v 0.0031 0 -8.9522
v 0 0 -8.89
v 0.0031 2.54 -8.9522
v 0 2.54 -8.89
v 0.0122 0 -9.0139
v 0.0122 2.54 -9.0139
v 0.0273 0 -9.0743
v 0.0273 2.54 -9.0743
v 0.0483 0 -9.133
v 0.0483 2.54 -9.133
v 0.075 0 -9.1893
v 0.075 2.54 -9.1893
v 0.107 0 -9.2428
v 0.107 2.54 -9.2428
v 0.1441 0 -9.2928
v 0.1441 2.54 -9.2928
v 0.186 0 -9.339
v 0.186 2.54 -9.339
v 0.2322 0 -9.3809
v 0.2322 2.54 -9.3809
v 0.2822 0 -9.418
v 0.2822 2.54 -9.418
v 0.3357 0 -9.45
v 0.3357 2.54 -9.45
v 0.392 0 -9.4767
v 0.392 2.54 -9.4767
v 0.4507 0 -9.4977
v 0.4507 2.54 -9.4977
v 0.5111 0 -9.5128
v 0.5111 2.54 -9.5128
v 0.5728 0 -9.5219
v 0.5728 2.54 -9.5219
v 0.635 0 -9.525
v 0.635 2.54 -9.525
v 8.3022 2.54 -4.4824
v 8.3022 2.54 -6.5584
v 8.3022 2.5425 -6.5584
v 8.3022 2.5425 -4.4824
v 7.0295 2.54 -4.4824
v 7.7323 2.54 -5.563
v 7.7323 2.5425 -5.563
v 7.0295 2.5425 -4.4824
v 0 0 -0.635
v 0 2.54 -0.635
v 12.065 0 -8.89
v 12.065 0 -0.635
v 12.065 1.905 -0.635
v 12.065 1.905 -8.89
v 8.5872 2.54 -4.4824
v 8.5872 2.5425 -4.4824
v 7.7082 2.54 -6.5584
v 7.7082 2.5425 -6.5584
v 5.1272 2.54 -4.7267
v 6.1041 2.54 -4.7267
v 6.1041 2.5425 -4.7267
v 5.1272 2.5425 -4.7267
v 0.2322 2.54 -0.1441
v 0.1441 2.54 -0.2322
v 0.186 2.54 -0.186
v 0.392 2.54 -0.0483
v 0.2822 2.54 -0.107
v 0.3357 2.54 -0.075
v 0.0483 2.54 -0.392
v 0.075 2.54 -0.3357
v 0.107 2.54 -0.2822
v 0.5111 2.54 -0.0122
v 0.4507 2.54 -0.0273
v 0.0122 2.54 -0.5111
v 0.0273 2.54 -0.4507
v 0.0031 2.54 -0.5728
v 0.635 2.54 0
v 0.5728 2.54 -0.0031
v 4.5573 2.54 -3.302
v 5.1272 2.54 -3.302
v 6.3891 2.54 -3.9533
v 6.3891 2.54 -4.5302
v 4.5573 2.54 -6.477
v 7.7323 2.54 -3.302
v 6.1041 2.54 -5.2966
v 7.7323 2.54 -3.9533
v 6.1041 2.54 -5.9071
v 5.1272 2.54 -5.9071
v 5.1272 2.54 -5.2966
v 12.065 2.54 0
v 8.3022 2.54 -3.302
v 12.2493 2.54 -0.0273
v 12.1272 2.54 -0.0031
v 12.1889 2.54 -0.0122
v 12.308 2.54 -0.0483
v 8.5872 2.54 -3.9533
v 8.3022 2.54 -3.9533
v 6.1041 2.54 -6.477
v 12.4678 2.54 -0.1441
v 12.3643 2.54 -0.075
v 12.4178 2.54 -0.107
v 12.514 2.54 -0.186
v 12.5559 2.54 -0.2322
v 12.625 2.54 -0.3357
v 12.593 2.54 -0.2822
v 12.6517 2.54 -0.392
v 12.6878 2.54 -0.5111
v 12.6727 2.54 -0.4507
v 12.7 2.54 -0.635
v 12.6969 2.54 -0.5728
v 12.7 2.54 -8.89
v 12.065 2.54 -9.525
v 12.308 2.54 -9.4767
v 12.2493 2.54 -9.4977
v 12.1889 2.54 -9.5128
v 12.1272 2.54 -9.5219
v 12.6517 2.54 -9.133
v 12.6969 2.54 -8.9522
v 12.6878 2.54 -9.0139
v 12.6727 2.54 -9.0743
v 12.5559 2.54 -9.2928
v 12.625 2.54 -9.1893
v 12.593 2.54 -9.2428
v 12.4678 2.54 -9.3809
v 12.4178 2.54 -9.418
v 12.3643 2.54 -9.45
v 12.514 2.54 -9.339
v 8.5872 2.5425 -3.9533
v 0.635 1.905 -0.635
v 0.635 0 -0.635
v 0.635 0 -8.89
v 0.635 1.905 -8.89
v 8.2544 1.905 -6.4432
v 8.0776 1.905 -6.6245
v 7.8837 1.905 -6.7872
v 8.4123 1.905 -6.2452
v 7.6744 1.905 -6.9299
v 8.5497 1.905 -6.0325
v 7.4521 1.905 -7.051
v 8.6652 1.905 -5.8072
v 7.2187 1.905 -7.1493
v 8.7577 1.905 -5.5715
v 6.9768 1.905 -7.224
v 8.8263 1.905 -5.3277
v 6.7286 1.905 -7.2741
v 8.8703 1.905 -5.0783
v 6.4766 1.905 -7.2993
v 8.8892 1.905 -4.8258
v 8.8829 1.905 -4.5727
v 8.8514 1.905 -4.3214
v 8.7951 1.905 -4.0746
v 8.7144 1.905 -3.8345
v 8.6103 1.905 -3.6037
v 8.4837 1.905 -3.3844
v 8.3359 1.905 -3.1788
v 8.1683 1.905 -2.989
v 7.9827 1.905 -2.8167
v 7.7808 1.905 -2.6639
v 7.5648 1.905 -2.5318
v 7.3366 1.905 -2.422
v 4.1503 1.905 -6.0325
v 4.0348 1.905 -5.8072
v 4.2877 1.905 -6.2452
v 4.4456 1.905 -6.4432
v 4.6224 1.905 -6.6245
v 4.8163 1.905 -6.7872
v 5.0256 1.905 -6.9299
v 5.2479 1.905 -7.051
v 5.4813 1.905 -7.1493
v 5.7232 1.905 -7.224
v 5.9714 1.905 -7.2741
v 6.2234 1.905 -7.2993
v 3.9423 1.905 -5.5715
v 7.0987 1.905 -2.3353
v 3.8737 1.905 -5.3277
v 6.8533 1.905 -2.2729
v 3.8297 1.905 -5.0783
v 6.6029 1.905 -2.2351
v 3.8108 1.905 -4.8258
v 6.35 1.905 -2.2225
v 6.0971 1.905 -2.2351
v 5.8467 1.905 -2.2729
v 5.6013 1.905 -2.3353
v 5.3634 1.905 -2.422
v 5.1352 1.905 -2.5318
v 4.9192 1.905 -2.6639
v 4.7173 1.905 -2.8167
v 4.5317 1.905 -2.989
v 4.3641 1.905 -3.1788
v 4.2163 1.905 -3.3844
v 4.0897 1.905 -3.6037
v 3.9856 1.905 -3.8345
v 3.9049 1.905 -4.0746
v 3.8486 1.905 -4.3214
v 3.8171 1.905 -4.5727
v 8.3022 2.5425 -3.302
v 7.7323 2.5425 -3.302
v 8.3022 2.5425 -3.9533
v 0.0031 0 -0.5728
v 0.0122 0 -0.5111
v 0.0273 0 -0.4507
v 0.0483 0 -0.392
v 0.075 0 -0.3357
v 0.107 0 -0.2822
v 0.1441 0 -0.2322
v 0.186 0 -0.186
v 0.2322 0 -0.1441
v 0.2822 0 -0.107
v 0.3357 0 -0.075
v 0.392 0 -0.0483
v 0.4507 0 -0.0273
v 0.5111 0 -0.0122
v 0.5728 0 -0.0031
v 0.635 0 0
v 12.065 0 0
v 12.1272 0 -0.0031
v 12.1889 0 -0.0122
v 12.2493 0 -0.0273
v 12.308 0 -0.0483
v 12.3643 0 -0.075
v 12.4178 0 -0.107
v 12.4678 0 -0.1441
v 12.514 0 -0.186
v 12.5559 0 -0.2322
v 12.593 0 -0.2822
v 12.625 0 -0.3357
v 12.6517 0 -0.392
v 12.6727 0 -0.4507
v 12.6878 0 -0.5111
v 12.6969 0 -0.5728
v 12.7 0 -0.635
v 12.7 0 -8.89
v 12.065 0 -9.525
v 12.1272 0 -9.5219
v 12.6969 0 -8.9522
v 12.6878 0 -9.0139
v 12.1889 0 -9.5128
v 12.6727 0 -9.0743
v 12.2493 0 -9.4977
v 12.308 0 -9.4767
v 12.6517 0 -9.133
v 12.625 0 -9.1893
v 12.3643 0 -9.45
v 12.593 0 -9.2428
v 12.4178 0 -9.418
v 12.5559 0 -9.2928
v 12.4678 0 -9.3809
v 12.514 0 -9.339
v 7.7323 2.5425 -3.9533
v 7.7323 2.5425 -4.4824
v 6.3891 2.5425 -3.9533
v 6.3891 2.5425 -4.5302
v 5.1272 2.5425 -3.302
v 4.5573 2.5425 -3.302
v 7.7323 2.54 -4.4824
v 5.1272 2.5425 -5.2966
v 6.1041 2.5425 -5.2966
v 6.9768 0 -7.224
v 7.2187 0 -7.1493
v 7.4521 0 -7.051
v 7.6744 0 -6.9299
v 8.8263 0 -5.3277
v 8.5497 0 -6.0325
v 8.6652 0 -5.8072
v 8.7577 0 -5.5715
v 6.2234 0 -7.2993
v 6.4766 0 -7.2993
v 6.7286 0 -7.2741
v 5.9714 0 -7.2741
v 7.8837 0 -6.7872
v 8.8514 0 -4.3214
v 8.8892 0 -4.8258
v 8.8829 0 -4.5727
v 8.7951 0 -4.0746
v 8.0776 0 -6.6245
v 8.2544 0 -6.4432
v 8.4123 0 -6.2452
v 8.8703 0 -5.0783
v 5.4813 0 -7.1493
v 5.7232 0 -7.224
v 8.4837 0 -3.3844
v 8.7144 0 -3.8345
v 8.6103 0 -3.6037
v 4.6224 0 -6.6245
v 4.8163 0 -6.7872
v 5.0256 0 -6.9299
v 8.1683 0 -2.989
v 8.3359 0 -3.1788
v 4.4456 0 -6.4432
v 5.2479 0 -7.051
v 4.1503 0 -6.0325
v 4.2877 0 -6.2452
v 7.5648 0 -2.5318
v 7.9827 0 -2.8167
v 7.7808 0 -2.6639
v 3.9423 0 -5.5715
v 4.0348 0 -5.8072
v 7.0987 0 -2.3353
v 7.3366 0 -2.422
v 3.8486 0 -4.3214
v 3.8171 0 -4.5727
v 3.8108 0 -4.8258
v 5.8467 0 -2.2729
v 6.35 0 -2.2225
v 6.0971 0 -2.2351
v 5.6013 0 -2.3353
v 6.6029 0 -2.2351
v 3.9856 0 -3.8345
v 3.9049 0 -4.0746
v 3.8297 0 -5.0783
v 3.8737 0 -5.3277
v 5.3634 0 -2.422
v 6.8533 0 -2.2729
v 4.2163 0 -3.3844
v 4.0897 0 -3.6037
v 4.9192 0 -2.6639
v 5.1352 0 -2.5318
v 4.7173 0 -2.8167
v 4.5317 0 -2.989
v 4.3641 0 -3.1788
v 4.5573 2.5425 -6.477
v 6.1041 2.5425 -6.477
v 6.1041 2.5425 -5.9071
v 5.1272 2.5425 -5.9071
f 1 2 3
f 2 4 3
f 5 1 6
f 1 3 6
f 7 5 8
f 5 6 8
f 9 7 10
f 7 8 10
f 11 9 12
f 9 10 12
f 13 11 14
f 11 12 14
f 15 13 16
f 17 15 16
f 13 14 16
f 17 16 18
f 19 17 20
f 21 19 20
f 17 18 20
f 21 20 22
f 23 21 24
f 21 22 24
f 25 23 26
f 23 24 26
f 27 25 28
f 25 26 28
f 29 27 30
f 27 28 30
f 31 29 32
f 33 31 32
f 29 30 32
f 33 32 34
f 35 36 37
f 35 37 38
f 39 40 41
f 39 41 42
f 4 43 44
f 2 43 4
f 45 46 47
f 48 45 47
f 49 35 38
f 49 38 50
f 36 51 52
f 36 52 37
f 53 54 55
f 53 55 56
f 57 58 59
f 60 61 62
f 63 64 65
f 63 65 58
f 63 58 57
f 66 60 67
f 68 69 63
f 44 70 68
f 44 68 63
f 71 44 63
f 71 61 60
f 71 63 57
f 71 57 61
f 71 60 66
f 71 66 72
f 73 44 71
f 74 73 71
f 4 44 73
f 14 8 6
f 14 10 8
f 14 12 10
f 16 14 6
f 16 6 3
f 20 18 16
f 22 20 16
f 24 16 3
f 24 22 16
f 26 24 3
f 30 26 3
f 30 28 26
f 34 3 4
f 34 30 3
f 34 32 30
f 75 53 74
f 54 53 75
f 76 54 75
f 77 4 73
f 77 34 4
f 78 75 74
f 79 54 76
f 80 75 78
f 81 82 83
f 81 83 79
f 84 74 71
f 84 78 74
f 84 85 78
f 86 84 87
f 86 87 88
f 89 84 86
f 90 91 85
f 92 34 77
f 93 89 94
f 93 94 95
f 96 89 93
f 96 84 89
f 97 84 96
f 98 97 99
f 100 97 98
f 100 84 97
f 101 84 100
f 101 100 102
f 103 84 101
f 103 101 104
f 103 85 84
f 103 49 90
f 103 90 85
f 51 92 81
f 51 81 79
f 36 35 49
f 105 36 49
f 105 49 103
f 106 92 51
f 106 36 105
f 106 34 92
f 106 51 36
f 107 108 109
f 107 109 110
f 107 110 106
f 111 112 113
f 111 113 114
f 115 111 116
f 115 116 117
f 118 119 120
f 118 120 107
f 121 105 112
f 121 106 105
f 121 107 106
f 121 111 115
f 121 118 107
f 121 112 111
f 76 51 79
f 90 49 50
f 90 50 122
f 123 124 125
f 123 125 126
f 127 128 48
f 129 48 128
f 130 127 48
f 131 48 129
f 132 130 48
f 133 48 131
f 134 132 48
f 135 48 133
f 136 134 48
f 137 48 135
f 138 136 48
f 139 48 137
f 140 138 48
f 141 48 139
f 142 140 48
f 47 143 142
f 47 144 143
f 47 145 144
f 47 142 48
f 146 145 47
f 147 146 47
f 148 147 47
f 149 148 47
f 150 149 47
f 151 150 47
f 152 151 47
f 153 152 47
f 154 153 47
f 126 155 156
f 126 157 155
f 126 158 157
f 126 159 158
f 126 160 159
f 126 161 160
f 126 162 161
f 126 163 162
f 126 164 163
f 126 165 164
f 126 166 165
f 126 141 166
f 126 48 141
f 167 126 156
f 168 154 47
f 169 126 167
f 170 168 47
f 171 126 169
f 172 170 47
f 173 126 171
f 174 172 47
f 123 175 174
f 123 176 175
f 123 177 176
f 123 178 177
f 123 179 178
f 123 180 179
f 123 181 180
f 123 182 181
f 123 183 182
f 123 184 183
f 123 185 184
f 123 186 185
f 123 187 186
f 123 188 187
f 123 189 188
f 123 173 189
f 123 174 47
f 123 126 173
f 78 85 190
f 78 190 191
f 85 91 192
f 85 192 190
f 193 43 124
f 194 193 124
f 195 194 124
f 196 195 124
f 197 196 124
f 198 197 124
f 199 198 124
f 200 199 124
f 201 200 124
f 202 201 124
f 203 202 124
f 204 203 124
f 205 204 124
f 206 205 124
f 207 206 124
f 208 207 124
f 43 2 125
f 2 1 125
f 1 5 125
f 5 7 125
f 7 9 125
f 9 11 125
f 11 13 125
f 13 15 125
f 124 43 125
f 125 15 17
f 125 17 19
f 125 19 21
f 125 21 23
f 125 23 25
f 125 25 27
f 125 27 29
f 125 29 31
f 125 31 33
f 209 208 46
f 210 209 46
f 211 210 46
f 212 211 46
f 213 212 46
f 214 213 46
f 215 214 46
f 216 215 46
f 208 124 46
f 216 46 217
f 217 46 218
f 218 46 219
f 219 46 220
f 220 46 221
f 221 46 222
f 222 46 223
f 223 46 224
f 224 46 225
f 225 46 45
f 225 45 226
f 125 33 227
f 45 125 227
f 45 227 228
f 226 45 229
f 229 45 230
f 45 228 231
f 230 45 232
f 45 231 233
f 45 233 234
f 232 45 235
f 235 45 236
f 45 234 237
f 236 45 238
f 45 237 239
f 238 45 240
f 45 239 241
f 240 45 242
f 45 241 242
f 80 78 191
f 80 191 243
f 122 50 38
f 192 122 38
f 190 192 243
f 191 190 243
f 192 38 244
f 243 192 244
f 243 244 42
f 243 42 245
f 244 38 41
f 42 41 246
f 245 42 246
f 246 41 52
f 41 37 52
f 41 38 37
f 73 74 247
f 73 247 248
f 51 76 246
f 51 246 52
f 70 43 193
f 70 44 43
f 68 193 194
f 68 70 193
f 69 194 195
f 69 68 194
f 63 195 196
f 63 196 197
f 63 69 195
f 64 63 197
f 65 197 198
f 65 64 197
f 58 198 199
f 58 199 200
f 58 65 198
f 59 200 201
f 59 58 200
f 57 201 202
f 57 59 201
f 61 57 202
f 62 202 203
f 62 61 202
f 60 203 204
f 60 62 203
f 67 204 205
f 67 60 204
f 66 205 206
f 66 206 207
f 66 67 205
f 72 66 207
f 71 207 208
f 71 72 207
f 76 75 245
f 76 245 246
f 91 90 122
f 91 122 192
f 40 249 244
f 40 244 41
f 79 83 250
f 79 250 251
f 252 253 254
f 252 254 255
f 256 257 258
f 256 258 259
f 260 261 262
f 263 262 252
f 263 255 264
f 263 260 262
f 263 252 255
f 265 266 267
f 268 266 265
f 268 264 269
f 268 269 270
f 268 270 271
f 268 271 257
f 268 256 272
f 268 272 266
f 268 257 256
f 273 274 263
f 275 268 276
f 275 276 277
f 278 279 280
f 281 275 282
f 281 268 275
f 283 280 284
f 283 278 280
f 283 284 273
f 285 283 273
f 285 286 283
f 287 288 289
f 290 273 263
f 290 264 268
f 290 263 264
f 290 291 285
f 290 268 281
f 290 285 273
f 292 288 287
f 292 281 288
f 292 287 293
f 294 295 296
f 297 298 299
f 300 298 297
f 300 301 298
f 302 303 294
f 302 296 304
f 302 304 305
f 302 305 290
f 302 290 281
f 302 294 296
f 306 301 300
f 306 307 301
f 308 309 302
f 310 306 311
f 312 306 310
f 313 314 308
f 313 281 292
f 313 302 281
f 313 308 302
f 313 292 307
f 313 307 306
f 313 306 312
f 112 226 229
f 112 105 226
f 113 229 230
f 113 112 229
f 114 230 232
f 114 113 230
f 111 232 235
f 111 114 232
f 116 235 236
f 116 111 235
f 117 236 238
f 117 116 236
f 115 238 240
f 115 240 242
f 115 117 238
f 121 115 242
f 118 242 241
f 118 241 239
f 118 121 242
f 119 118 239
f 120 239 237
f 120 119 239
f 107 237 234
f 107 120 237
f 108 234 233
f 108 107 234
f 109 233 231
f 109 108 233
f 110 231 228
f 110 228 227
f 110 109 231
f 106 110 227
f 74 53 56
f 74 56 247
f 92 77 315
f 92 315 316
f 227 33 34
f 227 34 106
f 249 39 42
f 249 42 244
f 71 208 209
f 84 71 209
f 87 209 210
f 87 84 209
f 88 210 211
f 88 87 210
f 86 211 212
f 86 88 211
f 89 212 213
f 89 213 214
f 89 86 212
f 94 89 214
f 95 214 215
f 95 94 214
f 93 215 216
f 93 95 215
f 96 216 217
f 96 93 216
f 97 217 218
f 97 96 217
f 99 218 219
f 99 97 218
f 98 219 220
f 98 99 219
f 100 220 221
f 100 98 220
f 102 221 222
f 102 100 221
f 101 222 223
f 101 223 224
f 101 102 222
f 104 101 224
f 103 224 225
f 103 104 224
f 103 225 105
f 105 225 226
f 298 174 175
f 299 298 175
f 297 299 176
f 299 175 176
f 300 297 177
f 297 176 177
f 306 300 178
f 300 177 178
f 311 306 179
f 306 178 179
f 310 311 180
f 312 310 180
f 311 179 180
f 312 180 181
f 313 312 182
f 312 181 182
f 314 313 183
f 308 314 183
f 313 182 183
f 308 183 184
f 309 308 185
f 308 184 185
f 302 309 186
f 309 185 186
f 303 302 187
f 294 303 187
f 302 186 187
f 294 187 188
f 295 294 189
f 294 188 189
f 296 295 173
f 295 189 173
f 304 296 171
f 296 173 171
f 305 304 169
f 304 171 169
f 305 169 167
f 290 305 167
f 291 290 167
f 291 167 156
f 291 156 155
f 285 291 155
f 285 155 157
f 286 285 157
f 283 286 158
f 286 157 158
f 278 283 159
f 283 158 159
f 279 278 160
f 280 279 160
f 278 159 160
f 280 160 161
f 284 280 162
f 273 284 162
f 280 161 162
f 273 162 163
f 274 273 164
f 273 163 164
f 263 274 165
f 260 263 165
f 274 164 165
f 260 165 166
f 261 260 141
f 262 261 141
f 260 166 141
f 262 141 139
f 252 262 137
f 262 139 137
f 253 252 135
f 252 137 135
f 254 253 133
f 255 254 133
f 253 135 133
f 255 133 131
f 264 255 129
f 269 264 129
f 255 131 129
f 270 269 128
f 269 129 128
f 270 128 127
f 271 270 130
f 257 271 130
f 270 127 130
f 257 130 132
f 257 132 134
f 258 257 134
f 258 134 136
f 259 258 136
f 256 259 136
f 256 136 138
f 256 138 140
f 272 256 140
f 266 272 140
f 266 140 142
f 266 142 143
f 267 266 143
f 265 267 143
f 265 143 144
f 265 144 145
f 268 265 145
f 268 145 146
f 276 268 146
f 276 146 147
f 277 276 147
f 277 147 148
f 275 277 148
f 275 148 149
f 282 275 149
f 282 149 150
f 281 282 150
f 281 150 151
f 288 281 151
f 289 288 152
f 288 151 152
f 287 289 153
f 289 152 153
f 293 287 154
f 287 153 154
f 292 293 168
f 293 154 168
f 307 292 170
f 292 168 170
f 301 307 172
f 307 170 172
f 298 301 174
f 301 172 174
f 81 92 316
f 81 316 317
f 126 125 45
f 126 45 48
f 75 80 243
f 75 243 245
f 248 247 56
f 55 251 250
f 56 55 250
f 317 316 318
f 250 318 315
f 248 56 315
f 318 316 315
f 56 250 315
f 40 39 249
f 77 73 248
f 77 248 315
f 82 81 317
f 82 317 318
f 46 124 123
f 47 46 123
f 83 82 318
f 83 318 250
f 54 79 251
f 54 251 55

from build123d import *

# Parameters (mm, degrees)
SKETCH1_W           = 12.7
SKETCH1_H           = 9.525
BOSS_EXTRUDE1_DEPTH = 2.54
FILLET1_R           = 0.635
SHELL1_START        = 0.635
SHELL1_OUTLINE_W    = 1.905
SHELL1_OUTLINE_H    = 8.255
SHELL1_DEPTH        = 11.43
SKETCH2_R           = 2.54
BOSS_EXTRUDE2_DEPTH = 1.905
BOSS_EXTRUDE3_DEPTH = 0.00254


# Read off the part's stored shape, not the designer's step: Shell1
with BuildPart() as part:
    # Sketch1 → Boss-Extrude1 (new body)
    with BuildSketch(Plane(origin=(0, 0, 0), x_dir=(1, 0, 0), z_dir=(0, 1, 0))):
        with Locations((6.35, 4.7625)):
            Rectangle(SKETCH1_W, SKETCH1_H)
    extrude(amount=BOSS_EXTRUDE1_DEPTH)

    # Fillet1
    fillet1_edges = [part.edges().sort_by_distance(p)[0] for p in [
        (0, 1.27, -9.525),
        (12.7, 1.27, -9.525),
        (12.7, 1.27, 0),
        (0, 1.27, 0),
    ]]
    fillet(fillet1_edges, radius=FILLET1_R)

    # Shell1 outline → Shell1 (cut)
    with BuildSketch(Plane.YZ.offset(SHELL1_START)):
        with Locations((0.9525, -4.7625)):
            Rectangle(SHELL1_OUTLINE_W, SHELL1_OUTLINE_H)
    extrude(amount=SHELL1_DEPTH, mode=Mode.SUBTRACT)

    # Sketch2 → Boss-Extrude2 (add)
    with BuildSketch(Plane(origin=(0, 1.905, 0), x_dir=(-1, 0, 0), z_dir=(0, -1, 0))):
        with Locations(Location((-6.35, 4.7625, 0), (0, 0, 270))):
            Circle(SKETCH2_R)
    extrude(amount=BOSS_EXTRUDE2_DEPTH)

    # Sketch3 → Boss-Extrude3 (add)
    # profile 1 of 2: a face of its own
    with BuildSketch(Plane(origin=(0, 2.54, 0), x_dir=(1, 0, 0), z_dir=(0, 1, 0))):
        Polygon((4.557346154, 6.477), (6.104141026, 6.477), (6.104141026, 5.907128205), (5.127217949, 5.907128205), (5.127217949, 5.296551282), (6.104141026, 5.296551282), (6.104141026, 4.726679487), (5.127217949, 4.726679487), (5.127217949, 3.302), (4.557346154, 3.302), align=None)
    # profile 2 of 2: a face of its own
    with BuildSketch(Plane(origin=(0, 2.54, 0), x_dir=(1, 0, 0), z_dir=(0, 1, 0))):
        Polygon((7.708177484, 6.558410256), (8.302217949, 6.558410256), (8.302217949, 4.482448718), (8.587153846, 4.482448718), (8.587153846, 3.953282051), (8.302217949, 3.953282051), (8.302217949, 3.302), (7.732346154, 3.302), (7.732346154, 3.953282051), (6.389076923, 3.953282051), (6.389076923, 4.53015004), align=None)
        Polygon((7.732346154, 4.482448718), (7.732346154, 5.563042668), (7.029546675, 4.482448718), align=None, mode=Mode.SUBTRACT)
    extrude(amount=BOSS_EXTRUDE3_DEPTH)


solid = part.part
